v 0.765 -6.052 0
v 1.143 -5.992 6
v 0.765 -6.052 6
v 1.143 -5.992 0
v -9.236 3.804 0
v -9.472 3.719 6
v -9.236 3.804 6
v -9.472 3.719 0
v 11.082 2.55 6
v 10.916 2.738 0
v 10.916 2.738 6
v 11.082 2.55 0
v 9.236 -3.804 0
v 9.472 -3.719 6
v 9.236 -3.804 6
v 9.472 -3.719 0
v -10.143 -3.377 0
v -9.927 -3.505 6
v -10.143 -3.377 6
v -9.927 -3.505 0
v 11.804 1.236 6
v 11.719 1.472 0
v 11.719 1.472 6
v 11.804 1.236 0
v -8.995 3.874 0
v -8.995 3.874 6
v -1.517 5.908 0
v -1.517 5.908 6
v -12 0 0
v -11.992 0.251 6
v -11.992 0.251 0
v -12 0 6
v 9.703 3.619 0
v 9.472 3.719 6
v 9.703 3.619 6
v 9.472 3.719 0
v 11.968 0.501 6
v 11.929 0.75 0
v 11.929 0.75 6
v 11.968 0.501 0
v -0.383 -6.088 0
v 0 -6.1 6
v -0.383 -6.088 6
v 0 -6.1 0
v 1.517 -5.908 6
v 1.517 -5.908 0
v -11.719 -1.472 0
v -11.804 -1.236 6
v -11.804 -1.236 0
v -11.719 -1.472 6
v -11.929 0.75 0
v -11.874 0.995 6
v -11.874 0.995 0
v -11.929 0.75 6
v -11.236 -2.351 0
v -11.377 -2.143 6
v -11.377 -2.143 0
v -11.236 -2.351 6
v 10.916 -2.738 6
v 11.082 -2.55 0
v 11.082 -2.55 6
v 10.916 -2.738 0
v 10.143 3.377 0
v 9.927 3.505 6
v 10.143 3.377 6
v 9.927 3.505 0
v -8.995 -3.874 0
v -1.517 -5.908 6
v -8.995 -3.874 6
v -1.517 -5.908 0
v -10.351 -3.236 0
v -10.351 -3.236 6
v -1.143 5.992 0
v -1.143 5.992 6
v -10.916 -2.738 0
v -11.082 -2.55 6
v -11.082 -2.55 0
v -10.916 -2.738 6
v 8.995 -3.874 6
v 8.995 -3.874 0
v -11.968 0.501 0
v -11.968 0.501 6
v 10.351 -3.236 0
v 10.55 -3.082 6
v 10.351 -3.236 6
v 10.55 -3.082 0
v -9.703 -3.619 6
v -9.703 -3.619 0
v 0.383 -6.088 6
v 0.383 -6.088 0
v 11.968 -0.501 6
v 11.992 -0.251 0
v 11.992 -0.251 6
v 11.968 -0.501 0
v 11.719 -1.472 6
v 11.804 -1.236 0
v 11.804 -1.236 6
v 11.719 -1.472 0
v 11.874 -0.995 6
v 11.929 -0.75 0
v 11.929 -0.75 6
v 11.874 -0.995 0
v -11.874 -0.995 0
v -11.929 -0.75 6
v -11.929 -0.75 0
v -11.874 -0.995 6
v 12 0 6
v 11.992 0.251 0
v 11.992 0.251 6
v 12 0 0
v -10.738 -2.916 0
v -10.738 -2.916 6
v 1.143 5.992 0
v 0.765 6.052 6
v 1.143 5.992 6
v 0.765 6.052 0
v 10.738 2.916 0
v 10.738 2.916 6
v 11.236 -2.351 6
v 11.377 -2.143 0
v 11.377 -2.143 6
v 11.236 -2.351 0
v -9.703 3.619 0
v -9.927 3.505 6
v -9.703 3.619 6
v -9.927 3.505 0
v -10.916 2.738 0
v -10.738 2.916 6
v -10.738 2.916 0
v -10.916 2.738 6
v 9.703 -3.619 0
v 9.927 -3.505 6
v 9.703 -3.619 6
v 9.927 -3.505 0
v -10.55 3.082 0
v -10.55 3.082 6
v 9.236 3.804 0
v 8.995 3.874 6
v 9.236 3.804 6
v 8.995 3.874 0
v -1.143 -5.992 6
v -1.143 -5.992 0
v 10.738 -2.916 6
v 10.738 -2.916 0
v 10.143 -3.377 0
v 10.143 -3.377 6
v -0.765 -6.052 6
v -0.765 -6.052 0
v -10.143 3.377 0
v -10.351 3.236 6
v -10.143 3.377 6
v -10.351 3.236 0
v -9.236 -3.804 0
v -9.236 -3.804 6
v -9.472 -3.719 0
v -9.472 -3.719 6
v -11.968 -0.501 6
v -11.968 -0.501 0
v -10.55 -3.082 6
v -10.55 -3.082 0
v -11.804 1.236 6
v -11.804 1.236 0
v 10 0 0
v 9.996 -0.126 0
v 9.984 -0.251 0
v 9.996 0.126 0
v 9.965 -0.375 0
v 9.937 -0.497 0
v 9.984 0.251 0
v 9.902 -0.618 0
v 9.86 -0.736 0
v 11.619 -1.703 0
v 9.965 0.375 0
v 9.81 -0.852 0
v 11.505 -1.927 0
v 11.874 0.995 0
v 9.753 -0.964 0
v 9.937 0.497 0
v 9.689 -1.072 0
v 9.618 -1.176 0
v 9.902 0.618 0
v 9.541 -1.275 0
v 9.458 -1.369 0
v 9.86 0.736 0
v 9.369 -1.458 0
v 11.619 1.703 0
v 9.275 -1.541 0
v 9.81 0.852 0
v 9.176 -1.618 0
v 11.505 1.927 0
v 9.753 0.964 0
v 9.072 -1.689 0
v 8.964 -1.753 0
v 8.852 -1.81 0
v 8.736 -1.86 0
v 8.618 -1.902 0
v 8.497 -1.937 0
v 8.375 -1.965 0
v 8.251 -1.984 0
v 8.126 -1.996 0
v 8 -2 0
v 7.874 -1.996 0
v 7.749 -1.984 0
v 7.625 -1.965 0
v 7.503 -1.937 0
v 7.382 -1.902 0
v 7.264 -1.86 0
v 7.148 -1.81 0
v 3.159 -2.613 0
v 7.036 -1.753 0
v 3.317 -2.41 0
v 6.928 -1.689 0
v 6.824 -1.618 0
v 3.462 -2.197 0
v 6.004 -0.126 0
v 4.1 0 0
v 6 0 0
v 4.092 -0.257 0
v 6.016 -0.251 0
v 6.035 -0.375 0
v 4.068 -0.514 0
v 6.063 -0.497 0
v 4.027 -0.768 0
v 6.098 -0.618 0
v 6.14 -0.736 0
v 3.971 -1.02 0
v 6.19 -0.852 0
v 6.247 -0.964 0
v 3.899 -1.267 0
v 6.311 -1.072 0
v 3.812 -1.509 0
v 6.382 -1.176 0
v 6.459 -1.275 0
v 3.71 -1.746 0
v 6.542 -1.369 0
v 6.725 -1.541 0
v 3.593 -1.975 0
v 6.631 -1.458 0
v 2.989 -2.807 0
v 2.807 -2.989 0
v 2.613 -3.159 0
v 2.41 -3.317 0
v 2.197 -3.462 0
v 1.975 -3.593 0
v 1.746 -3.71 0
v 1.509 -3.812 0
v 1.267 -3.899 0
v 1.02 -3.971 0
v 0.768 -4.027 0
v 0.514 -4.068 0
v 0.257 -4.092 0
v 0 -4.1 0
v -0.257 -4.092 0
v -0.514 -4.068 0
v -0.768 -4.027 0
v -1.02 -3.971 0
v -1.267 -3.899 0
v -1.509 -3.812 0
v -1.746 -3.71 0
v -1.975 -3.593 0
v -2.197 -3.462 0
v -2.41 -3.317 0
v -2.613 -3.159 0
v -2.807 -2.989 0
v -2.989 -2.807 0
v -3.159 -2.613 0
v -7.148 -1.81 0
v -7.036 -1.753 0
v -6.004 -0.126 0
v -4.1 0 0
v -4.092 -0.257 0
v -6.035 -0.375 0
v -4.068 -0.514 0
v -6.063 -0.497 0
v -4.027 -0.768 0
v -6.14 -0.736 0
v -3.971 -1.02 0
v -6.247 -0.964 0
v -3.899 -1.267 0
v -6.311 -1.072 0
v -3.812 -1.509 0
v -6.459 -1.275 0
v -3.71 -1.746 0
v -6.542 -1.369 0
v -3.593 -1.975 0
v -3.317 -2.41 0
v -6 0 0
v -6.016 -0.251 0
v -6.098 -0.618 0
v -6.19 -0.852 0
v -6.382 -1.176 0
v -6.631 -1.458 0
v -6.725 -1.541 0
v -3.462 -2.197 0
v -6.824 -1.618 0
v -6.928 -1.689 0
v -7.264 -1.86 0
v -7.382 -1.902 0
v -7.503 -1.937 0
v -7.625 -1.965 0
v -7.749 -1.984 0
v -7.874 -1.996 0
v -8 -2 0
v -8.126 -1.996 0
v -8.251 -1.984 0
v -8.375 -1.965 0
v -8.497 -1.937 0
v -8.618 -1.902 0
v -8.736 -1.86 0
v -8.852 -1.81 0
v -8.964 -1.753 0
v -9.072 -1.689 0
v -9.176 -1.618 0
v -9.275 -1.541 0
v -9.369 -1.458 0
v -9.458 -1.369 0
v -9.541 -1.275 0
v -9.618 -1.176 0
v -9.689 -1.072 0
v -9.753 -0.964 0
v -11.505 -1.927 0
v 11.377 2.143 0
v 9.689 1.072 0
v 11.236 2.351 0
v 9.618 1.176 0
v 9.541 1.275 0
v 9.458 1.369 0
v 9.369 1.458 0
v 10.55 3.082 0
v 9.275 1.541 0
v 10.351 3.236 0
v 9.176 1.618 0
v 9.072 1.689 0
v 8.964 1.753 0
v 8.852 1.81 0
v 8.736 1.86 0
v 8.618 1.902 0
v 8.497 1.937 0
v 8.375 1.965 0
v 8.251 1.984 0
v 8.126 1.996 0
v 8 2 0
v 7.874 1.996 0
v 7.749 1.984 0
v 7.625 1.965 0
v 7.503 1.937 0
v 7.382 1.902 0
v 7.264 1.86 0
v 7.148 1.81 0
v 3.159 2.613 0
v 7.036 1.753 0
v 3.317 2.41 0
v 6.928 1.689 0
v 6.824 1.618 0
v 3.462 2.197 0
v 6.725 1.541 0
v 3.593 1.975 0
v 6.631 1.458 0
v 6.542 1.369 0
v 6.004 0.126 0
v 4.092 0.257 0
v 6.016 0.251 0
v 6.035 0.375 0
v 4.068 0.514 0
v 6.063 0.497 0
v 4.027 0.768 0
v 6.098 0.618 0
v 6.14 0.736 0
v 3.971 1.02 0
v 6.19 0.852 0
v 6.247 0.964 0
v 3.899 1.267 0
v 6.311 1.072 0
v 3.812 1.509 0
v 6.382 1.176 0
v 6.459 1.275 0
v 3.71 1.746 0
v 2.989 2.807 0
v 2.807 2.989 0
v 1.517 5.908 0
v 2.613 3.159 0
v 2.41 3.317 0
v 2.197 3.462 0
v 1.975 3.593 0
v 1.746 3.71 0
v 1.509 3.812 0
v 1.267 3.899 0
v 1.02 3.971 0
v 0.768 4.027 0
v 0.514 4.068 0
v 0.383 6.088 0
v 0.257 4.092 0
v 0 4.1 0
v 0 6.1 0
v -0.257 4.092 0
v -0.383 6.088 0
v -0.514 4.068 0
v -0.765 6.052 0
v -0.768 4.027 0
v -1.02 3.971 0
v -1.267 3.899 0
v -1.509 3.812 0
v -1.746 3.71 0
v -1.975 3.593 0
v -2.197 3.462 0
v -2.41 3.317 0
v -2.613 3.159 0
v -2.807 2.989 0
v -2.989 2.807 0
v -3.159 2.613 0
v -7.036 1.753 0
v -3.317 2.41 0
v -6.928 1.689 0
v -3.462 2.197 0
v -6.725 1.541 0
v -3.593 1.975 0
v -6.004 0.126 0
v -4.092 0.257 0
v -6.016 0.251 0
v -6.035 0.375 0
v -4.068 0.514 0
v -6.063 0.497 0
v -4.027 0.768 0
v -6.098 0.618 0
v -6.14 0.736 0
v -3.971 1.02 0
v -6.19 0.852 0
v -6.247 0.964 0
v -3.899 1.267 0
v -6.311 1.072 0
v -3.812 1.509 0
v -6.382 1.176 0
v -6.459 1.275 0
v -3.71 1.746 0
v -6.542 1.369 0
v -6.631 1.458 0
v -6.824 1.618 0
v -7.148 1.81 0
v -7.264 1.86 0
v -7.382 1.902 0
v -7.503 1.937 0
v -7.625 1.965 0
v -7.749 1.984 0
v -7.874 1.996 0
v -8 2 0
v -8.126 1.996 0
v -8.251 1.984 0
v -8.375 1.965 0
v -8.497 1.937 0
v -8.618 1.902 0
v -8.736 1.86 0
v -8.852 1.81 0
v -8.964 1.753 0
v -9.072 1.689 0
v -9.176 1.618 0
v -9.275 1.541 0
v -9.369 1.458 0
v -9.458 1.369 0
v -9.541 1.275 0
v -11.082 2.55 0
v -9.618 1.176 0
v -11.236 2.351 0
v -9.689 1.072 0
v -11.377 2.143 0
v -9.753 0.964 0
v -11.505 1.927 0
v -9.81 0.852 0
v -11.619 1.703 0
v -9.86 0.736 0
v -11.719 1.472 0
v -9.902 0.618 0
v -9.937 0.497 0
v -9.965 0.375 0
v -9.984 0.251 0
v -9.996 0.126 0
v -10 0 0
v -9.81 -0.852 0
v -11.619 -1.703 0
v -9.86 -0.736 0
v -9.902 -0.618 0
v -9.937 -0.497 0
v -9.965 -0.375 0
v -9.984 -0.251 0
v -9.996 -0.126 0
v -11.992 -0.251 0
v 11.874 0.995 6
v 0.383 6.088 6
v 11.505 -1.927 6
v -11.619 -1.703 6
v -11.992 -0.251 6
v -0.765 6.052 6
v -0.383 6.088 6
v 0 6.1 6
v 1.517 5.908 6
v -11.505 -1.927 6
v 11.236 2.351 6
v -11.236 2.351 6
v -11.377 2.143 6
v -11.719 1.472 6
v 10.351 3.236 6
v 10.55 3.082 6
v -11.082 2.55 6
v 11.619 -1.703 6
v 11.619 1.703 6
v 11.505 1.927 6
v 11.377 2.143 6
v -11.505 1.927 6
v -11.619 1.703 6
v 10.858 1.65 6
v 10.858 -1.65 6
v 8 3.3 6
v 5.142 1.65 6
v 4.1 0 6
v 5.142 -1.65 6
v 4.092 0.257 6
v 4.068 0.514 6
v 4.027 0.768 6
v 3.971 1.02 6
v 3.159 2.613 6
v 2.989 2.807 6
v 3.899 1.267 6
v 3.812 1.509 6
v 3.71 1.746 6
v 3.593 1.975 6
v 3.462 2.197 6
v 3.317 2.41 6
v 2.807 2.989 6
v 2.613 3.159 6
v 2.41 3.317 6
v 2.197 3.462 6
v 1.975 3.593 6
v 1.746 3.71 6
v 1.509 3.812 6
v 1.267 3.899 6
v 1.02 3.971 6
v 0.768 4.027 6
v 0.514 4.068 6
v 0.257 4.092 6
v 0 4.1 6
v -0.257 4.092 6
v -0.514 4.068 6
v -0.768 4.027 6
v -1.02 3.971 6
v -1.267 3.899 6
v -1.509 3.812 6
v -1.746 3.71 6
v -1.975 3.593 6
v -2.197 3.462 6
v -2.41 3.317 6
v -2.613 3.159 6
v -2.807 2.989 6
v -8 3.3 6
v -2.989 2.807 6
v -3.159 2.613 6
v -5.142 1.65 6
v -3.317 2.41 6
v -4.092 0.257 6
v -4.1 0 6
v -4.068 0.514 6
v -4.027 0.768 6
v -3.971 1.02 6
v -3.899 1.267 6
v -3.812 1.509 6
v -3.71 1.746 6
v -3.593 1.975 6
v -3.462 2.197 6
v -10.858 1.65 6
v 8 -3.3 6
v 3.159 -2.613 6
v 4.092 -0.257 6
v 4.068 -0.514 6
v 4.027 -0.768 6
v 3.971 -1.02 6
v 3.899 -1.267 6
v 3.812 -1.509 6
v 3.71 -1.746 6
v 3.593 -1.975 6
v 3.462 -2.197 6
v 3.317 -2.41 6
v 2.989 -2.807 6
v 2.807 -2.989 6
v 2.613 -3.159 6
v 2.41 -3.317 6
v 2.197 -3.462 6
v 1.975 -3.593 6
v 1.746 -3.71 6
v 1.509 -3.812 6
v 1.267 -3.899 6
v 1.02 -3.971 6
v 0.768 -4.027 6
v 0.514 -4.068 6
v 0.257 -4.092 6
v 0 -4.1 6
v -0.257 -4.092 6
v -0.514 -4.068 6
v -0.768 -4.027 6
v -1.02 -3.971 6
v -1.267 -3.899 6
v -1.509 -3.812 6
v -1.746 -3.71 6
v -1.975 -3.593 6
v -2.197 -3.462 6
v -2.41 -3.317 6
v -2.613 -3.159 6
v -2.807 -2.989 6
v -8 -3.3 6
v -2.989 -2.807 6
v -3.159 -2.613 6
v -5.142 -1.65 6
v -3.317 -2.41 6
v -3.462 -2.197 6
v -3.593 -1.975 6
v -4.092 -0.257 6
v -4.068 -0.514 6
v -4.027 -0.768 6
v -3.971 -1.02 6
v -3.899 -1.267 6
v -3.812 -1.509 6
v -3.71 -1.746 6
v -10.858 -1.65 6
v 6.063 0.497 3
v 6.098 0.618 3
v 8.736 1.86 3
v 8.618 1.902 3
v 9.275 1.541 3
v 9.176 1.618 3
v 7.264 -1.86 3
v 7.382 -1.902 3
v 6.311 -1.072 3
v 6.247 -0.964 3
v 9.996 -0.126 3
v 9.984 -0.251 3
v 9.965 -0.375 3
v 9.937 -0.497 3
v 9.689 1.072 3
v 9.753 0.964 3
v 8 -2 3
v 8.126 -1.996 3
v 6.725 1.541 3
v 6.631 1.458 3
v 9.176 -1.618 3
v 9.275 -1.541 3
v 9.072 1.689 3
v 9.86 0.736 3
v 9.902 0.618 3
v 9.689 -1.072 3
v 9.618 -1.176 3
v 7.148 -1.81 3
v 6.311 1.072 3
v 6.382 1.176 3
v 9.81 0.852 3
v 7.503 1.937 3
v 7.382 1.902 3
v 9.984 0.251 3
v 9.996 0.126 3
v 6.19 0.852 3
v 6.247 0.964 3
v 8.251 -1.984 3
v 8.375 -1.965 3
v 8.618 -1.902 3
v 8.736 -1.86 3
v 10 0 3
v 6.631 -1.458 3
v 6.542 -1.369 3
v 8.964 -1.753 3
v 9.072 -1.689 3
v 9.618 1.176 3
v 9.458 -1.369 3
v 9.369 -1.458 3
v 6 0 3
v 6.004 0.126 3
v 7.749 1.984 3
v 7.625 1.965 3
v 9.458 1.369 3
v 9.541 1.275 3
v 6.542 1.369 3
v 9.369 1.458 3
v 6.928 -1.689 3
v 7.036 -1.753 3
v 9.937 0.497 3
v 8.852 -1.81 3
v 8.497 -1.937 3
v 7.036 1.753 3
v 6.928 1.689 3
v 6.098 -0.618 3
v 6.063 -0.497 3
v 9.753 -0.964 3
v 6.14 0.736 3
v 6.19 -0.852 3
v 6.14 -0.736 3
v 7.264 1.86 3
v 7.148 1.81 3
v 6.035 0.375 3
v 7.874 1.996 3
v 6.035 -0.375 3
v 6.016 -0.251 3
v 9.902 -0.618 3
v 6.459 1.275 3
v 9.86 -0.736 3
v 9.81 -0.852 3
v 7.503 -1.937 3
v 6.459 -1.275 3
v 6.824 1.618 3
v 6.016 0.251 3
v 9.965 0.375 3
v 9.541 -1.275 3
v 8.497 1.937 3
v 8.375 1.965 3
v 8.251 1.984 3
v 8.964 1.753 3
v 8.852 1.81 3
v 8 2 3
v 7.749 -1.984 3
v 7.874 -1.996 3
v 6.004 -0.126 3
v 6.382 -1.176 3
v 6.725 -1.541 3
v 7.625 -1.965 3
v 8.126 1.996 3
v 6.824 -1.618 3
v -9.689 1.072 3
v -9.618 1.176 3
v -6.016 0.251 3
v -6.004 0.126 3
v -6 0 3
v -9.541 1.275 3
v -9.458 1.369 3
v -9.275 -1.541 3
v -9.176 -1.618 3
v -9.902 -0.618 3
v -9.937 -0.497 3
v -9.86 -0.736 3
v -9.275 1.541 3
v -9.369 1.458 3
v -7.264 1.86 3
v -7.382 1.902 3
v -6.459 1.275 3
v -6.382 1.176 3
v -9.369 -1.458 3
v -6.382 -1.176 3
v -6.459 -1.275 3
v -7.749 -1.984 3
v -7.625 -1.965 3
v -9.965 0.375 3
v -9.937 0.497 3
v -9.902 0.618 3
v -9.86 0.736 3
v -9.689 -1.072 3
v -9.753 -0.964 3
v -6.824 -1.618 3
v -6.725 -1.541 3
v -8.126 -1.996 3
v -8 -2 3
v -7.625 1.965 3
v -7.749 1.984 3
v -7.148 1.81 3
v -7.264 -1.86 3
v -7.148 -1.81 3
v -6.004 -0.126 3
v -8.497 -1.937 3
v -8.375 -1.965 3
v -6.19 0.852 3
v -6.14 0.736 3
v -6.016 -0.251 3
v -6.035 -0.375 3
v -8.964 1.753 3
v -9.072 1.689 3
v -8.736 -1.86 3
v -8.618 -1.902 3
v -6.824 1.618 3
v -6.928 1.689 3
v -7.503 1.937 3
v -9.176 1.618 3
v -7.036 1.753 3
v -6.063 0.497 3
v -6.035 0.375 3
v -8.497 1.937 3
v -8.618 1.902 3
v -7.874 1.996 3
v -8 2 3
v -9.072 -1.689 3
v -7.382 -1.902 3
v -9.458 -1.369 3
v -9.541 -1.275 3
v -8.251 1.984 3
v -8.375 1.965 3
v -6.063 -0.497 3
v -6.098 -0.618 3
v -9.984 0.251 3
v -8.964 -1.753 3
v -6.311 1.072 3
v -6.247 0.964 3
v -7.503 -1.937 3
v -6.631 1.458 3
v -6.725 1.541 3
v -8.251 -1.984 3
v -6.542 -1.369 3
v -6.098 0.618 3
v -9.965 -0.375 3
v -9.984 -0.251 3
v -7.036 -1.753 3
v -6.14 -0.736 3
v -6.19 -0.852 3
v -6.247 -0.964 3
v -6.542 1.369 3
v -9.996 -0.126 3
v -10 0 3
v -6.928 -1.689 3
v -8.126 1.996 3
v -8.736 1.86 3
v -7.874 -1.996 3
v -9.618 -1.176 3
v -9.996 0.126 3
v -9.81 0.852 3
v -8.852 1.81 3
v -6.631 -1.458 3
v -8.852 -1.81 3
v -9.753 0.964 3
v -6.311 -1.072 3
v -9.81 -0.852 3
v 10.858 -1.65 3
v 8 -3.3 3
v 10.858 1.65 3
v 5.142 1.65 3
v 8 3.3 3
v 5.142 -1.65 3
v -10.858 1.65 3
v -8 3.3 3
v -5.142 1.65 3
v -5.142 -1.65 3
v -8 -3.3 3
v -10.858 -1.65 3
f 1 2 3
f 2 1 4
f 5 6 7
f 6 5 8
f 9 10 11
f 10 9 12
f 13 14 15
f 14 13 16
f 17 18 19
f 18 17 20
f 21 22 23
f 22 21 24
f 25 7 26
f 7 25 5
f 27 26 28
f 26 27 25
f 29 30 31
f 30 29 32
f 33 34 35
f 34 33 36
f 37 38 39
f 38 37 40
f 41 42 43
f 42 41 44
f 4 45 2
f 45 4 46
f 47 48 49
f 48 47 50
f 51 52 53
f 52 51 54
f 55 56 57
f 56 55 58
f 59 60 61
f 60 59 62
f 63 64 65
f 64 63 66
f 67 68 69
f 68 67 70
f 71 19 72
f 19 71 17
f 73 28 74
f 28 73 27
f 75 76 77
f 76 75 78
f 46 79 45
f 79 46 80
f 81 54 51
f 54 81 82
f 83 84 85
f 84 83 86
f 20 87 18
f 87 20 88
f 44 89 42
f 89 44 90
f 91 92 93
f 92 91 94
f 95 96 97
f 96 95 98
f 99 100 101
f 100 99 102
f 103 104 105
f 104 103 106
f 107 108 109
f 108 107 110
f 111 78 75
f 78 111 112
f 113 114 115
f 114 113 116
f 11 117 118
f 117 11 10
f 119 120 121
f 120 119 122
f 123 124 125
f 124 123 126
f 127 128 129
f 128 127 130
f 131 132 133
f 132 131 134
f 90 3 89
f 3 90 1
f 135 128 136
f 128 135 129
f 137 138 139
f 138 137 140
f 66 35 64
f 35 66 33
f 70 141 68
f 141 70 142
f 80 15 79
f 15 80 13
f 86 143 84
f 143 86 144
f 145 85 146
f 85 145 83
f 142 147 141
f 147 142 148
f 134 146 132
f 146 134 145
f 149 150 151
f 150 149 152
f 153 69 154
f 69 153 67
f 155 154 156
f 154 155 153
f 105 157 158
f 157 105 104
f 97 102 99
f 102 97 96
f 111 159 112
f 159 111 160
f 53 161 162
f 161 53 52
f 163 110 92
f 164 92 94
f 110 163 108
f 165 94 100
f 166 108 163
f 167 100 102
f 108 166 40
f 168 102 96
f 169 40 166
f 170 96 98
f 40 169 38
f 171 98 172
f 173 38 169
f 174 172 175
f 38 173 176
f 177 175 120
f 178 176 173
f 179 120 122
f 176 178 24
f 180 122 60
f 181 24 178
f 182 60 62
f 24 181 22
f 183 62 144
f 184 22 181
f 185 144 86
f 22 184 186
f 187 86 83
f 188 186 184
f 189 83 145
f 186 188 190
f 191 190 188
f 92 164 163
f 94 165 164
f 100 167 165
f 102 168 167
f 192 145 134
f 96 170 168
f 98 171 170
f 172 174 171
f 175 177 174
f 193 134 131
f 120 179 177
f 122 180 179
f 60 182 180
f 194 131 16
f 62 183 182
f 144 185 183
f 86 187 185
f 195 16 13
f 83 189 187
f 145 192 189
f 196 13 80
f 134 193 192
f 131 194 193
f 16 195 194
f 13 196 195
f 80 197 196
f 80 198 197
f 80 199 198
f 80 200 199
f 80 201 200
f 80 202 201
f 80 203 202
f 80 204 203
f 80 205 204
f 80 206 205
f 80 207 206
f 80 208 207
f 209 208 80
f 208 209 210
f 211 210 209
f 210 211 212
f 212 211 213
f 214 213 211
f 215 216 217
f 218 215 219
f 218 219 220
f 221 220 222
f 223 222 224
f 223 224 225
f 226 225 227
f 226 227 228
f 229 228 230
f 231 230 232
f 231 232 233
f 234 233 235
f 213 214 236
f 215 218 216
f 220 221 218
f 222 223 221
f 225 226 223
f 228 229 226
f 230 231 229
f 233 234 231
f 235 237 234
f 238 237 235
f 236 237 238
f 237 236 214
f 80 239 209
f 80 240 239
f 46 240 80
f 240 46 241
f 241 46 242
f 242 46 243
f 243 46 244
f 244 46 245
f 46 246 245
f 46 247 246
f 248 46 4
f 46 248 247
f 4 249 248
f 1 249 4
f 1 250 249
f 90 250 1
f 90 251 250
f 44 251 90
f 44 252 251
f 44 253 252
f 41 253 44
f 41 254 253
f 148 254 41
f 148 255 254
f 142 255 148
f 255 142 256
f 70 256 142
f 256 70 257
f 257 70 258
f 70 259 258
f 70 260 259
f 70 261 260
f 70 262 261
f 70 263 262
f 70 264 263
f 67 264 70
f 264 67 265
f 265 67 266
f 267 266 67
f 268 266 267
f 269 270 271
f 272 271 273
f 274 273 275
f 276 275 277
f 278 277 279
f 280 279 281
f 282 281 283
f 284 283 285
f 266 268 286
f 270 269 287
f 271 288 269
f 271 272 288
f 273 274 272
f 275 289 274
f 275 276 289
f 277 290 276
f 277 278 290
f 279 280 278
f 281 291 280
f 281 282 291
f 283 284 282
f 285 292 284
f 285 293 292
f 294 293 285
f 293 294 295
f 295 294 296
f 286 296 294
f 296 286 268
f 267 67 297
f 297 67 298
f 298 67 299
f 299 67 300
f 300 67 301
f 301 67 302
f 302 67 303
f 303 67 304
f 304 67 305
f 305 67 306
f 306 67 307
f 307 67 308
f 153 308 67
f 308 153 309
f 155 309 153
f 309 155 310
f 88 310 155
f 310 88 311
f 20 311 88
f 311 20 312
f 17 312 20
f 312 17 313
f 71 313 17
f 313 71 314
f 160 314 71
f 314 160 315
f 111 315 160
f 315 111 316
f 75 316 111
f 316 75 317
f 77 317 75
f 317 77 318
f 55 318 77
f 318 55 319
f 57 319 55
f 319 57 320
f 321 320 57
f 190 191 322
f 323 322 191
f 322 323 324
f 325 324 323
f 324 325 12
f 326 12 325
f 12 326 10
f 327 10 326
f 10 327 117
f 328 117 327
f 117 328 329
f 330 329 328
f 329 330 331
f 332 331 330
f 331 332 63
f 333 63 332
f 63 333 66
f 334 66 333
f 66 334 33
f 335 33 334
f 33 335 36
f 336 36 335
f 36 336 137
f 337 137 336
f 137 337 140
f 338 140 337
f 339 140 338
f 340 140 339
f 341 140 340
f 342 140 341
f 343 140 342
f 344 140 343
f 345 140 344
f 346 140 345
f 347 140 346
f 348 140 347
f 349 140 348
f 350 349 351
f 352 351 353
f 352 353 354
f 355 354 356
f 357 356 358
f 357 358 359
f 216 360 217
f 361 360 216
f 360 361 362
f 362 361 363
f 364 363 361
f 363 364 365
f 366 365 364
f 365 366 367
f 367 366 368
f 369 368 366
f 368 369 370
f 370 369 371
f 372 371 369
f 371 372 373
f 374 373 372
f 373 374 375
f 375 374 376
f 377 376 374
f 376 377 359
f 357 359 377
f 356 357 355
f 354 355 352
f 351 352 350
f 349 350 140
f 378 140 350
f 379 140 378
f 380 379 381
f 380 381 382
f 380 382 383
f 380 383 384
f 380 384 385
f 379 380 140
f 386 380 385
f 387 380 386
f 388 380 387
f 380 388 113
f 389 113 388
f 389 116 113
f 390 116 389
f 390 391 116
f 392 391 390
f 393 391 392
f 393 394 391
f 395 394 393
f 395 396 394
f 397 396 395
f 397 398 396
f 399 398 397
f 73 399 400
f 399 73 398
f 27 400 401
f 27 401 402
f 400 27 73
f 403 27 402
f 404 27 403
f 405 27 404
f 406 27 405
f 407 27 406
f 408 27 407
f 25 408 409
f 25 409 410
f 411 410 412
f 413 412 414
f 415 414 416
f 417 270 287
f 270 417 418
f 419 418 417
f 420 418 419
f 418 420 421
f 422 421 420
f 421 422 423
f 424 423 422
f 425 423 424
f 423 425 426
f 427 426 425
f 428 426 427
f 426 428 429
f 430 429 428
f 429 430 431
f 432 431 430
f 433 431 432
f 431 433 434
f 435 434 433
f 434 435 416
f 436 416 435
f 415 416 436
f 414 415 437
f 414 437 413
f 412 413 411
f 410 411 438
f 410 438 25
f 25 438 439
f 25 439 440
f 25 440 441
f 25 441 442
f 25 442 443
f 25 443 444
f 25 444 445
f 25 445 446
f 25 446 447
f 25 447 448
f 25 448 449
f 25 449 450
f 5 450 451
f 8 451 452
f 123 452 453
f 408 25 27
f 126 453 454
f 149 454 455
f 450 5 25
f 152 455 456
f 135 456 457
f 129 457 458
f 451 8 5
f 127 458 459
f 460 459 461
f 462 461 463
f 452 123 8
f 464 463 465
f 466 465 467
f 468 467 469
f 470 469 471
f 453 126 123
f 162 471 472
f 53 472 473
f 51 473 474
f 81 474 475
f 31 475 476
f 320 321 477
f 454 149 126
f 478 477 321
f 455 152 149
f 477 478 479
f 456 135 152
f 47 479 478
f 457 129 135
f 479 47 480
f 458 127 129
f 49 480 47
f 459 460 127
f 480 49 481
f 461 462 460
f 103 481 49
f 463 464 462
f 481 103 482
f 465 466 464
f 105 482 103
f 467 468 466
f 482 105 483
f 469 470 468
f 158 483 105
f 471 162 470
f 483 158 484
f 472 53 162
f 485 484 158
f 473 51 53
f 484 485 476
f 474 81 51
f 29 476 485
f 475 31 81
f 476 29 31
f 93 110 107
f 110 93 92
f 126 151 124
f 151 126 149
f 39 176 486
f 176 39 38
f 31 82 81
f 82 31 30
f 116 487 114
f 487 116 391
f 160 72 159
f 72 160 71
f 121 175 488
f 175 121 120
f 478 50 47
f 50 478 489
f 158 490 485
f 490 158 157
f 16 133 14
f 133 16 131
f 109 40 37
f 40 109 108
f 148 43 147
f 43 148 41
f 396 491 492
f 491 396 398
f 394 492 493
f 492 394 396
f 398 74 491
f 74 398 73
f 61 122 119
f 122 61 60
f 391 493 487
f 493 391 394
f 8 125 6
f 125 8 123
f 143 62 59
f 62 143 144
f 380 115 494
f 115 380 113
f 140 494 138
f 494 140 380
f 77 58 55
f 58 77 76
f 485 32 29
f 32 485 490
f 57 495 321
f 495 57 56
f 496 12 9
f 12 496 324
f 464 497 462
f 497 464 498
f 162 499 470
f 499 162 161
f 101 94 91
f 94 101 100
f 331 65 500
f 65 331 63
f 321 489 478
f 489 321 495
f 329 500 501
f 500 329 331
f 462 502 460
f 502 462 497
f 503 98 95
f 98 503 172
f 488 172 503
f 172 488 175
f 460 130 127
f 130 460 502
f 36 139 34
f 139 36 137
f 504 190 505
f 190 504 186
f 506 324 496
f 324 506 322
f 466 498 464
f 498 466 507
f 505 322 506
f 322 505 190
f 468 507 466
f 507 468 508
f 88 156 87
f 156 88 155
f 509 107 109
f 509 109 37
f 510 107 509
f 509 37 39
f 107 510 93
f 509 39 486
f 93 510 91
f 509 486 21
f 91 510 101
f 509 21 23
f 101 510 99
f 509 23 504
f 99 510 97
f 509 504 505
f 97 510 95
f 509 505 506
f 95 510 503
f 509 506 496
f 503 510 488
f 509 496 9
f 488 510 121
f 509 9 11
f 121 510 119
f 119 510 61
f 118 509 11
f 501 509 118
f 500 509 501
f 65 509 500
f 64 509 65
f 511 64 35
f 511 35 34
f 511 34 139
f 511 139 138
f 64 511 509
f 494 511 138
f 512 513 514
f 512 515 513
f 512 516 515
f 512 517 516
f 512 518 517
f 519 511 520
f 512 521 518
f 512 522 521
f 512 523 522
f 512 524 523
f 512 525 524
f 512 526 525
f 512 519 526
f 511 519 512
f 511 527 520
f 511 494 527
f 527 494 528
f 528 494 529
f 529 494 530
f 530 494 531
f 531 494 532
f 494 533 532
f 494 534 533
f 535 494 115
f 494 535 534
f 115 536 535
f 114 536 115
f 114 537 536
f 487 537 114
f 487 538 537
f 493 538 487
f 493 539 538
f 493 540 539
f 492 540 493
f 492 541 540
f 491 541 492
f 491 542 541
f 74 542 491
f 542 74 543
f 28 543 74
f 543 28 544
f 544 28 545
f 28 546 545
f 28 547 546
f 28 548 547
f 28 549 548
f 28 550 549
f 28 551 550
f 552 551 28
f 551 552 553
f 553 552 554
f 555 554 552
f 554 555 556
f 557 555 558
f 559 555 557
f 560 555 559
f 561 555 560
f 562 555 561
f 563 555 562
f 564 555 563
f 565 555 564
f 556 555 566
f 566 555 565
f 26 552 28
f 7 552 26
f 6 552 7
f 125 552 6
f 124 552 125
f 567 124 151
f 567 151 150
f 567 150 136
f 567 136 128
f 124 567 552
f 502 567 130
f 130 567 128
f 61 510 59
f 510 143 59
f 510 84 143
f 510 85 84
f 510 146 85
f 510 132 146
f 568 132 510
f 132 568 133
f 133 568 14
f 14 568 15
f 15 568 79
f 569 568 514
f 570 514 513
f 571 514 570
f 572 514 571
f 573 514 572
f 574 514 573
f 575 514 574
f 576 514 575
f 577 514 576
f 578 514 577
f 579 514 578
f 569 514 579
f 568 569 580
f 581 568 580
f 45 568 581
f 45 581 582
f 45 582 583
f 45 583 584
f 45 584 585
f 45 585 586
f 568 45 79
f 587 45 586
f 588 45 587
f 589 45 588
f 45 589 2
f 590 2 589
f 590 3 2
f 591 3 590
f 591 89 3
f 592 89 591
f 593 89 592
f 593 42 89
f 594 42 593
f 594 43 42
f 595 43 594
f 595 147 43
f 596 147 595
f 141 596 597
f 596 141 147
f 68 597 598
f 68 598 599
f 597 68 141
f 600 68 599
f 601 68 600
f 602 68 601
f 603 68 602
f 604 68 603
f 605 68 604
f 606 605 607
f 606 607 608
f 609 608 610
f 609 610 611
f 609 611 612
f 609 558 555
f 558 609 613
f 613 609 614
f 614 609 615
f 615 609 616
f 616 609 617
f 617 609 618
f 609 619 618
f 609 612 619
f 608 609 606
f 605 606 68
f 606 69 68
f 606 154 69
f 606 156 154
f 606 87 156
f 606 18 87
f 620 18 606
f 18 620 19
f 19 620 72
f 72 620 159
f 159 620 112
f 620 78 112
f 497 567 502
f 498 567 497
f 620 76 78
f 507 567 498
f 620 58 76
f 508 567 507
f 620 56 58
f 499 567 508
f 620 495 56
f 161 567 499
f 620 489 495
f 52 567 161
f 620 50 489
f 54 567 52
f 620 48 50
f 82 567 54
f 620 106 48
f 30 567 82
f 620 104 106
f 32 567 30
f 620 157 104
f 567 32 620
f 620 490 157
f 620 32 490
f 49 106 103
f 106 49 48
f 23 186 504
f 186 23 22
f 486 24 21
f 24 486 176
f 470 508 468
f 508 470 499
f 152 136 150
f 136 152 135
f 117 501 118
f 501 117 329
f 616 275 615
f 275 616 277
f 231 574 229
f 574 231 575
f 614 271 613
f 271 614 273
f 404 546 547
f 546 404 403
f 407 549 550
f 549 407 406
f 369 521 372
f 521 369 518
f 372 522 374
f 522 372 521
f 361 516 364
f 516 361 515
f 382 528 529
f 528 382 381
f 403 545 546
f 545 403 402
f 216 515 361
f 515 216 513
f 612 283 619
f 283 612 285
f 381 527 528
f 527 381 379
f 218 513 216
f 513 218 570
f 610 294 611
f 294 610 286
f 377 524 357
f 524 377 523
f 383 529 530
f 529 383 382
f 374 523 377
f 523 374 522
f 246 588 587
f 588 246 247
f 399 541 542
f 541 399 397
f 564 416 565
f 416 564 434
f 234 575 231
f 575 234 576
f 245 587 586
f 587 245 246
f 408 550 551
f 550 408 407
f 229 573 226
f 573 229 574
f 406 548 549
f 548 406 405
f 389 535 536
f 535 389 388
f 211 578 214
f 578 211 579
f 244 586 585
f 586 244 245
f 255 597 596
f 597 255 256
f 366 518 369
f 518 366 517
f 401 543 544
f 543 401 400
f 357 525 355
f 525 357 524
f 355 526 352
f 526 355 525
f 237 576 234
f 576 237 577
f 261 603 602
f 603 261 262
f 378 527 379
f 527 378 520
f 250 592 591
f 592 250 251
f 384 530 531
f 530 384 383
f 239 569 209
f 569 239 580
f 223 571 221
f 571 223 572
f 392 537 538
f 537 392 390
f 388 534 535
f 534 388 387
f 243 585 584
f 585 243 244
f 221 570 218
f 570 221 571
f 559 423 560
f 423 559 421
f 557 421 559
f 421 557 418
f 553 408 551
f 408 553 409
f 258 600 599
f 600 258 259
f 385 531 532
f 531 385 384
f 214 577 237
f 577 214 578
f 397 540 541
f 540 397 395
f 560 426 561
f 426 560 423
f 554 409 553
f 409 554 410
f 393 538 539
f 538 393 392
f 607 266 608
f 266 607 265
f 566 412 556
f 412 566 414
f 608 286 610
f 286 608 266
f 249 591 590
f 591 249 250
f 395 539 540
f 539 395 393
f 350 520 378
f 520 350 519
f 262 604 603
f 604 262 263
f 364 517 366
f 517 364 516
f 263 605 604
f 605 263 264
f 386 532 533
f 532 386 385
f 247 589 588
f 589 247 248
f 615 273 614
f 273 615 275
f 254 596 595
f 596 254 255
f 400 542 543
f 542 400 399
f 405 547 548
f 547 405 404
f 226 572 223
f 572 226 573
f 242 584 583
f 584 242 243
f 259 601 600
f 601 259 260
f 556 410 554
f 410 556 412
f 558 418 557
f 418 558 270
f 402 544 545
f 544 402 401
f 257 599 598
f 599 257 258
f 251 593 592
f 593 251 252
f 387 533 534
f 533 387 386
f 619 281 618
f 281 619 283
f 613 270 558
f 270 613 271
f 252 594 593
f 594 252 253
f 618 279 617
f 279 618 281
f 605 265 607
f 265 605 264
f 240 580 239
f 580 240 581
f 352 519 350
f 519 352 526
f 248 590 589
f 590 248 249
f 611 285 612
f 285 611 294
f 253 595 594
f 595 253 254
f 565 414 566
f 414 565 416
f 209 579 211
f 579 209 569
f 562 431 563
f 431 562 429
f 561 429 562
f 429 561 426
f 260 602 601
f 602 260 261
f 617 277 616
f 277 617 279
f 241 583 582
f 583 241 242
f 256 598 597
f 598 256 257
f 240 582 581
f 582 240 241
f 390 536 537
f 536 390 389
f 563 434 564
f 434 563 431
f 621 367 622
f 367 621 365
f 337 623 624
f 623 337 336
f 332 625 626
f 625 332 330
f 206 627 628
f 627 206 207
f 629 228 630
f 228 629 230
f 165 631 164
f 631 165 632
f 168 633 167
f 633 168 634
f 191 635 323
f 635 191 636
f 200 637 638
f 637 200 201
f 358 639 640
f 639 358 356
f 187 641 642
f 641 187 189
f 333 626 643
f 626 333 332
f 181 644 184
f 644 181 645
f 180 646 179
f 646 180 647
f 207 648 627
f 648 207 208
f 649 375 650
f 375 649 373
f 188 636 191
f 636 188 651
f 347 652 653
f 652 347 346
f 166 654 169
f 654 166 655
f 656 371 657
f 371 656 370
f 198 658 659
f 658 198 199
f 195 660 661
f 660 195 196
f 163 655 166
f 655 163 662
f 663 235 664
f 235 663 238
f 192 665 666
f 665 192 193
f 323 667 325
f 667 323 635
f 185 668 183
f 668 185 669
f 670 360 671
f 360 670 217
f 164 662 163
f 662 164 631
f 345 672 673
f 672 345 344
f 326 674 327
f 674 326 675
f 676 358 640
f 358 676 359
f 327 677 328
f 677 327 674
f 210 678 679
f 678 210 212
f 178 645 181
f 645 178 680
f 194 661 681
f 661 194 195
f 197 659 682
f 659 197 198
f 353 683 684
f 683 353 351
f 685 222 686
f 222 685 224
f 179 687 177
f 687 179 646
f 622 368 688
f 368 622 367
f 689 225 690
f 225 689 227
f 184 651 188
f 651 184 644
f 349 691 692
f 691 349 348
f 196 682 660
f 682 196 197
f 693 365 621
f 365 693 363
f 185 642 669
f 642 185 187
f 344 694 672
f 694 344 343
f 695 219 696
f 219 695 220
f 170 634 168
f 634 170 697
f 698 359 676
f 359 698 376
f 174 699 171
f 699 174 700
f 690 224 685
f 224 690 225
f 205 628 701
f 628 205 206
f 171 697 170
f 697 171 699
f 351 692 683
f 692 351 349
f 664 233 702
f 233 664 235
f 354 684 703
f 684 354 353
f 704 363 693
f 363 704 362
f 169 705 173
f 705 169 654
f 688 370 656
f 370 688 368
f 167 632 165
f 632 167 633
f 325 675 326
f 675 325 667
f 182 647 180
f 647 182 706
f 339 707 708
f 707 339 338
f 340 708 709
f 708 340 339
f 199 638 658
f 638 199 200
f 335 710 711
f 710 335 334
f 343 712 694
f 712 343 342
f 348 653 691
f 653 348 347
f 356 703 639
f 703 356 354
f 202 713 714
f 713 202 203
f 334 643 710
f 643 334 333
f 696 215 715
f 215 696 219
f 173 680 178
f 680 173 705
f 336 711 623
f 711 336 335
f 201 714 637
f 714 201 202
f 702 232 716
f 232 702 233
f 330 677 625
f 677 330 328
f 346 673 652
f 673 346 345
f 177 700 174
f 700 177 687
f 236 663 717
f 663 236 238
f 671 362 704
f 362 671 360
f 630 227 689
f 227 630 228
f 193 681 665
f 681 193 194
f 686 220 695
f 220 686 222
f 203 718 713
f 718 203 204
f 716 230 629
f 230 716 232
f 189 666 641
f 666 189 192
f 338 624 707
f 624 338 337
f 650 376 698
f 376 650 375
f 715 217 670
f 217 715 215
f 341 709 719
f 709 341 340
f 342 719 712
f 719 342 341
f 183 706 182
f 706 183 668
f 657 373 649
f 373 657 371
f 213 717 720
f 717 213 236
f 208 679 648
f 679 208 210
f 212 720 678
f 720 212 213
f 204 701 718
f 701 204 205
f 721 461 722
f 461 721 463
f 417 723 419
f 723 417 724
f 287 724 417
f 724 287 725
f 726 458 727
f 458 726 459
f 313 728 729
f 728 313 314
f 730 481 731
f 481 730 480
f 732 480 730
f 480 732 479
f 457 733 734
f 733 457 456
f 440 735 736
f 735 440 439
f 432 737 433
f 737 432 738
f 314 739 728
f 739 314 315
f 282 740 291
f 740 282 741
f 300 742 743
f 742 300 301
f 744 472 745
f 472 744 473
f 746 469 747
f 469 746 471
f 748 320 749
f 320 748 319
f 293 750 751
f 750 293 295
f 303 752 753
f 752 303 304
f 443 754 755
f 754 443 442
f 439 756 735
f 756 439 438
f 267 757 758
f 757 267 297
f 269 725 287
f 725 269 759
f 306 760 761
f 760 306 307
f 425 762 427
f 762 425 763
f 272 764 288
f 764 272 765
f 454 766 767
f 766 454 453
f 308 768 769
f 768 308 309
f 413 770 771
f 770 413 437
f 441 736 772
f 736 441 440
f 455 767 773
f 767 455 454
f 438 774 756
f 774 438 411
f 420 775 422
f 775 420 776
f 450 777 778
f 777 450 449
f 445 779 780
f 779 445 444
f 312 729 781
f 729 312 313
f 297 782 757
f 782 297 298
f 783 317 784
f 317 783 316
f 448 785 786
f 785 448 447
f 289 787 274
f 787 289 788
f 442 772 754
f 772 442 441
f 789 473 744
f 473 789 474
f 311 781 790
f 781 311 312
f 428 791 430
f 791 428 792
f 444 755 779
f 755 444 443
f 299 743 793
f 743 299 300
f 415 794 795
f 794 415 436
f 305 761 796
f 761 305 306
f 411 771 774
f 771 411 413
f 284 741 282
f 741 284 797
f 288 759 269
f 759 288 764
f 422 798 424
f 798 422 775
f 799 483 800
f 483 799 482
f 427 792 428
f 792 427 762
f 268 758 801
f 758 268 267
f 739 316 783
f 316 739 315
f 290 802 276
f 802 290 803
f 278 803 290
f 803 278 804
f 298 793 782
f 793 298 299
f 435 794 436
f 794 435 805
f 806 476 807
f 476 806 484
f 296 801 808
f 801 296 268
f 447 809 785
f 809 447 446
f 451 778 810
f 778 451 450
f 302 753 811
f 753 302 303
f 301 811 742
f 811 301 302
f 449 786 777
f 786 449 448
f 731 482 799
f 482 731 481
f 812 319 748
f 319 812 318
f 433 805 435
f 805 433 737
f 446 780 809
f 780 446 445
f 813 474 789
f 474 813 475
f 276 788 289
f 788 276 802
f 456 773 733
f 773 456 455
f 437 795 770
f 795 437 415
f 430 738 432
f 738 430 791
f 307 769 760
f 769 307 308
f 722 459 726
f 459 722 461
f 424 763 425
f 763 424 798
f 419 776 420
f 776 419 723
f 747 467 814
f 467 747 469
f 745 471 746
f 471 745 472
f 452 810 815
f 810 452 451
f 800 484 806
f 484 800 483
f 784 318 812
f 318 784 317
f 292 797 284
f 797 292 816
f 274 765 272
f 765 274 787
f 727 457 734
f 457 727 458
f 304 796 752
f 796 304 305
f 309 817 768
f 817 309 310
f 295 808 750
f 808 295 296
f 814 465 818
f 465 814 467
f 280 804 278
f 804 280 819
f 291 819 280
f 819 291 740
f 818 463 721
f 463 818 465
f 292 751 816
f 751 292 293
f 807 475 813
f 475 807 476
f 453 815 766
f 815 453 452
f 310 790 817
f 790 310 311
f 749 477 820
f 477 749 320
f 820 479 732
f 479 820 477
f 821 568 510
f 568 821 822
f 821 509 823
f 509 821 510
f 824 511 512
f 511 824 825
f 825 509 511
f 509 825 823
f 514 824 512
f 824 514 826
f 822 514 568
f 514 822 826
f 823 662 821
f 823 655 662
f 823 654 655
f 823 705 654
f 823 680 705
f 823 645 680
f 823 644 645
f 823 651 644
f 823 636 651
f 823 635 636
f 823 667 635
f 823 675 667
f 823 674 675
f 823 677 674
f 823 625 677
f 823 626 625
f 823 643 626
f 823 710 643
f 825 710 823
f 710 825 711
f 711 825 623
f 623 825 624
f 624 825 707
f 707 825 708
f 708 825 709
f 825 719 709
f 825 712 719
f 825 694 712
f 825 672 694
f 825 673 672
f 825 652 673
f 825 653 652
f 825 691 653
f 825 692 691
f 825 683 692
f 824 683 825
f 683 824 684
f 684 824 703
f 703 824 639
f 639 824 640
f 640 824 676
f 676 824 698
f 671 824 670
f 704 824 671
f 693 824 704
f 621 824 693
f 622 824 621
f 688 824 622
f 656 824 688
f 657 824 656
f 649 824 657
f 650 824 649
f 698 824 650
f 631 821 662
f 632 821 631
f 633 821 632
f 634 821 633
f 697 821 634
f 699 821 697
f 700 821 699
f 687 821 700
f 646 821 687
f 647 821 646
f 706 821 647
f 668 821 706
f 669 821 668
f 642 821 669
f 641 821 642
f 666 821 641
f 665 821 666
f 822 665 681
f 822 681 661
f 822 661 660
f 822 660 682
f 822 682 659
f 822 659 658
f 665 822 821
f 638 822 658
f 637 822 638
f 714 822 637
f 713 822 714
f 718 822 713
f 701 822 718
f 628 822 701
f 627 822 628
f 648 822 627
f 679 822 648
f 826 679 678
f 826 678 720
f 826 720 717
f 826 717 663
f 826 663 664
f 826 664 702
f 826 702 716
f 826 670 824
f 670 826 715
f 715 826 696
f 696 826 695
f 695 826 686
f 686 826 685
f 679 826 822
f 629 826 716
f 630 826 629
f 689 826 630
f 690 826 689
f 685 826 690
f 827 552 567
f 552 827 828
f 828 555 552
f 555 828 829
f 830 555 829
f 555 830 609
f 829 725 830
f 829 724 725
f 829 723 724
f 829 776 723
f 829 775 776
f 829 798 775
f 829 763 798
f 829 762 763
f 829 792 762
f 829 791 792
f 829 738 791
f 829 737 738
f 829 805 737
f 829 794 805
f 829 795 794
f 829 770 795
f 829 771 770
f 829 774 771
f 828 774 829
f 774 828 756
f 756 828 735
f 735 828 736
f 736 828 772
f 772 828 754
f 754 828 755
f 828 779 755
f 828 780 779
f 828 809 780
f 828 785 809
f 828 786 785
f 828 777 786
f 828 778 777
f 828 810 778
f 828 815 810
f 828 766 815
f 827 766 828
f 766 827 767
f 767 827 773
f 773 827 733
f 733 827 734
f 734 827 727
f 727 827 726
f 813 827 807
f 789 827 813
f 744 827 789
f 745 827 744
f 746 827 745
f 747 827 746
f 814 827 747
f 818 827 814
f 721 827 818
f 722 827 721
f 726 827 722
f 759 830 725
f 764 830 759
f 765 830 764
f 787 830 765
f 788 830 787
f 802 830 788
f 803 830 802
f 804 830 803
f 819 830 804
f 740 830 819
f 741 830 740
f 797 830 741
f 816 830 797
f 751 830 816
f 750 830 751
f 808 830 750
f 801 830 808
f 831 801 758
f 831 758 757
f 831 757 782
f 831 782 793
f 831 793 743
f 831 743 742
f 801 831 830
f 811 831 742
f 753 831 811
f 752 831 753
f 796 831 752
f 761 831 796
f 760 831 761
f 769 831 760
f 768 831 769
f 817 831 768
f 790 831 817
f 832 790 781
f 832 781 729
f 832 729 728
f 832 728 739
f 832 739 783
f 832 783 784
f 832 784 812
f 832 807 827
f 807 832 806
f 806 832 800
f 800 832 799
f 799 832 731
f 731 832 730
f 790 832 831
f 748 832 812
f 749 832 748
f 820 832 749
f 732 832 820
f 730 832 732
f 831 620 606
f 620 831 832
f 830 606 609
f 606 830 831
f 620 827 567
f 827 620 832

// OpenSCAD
r_tige=4.1;
r_cote=4;
r_m3=2;
r_ecrou_m3=3.3;
ecart=8;
hauteur=6;

module support_axe_y(){
	difference(){
		hull(){
			cylinder(h=hauteur, r=r_tige+2, $fn=100);
			translate([ecart,0,0]){cylinder(h=hauteur, r=r_cote, $fn=100);}
			translate([-ecart,0,0]){cylinder(h=hauteur, r=r_cote, $fn=100);}
		}
		translate([0,0,-5]){cylinder(h=hauteur+10, r=r_tige, $fn=100);}
		translate([ecart,0,-5]){cylinder(h=hauteur+10, r=r_m3, $fn=100);}
		translate([-ecart,0,-5]){cylinder(h=hauteur+10, r=r_m3, $fn=100);}

		translate([ecart,0,hauteur-3]){rotate([0,0,30])cylinder(h=hauteur, r=r_ecrou_m3, $fn=6);}
		translate([-ecart,0,hauteur-3]){rotate([0,0,30])cylinder(h=hauteur, r=r_ecrou_m3, $fn=6);}
	}

}

support_axe_y();
